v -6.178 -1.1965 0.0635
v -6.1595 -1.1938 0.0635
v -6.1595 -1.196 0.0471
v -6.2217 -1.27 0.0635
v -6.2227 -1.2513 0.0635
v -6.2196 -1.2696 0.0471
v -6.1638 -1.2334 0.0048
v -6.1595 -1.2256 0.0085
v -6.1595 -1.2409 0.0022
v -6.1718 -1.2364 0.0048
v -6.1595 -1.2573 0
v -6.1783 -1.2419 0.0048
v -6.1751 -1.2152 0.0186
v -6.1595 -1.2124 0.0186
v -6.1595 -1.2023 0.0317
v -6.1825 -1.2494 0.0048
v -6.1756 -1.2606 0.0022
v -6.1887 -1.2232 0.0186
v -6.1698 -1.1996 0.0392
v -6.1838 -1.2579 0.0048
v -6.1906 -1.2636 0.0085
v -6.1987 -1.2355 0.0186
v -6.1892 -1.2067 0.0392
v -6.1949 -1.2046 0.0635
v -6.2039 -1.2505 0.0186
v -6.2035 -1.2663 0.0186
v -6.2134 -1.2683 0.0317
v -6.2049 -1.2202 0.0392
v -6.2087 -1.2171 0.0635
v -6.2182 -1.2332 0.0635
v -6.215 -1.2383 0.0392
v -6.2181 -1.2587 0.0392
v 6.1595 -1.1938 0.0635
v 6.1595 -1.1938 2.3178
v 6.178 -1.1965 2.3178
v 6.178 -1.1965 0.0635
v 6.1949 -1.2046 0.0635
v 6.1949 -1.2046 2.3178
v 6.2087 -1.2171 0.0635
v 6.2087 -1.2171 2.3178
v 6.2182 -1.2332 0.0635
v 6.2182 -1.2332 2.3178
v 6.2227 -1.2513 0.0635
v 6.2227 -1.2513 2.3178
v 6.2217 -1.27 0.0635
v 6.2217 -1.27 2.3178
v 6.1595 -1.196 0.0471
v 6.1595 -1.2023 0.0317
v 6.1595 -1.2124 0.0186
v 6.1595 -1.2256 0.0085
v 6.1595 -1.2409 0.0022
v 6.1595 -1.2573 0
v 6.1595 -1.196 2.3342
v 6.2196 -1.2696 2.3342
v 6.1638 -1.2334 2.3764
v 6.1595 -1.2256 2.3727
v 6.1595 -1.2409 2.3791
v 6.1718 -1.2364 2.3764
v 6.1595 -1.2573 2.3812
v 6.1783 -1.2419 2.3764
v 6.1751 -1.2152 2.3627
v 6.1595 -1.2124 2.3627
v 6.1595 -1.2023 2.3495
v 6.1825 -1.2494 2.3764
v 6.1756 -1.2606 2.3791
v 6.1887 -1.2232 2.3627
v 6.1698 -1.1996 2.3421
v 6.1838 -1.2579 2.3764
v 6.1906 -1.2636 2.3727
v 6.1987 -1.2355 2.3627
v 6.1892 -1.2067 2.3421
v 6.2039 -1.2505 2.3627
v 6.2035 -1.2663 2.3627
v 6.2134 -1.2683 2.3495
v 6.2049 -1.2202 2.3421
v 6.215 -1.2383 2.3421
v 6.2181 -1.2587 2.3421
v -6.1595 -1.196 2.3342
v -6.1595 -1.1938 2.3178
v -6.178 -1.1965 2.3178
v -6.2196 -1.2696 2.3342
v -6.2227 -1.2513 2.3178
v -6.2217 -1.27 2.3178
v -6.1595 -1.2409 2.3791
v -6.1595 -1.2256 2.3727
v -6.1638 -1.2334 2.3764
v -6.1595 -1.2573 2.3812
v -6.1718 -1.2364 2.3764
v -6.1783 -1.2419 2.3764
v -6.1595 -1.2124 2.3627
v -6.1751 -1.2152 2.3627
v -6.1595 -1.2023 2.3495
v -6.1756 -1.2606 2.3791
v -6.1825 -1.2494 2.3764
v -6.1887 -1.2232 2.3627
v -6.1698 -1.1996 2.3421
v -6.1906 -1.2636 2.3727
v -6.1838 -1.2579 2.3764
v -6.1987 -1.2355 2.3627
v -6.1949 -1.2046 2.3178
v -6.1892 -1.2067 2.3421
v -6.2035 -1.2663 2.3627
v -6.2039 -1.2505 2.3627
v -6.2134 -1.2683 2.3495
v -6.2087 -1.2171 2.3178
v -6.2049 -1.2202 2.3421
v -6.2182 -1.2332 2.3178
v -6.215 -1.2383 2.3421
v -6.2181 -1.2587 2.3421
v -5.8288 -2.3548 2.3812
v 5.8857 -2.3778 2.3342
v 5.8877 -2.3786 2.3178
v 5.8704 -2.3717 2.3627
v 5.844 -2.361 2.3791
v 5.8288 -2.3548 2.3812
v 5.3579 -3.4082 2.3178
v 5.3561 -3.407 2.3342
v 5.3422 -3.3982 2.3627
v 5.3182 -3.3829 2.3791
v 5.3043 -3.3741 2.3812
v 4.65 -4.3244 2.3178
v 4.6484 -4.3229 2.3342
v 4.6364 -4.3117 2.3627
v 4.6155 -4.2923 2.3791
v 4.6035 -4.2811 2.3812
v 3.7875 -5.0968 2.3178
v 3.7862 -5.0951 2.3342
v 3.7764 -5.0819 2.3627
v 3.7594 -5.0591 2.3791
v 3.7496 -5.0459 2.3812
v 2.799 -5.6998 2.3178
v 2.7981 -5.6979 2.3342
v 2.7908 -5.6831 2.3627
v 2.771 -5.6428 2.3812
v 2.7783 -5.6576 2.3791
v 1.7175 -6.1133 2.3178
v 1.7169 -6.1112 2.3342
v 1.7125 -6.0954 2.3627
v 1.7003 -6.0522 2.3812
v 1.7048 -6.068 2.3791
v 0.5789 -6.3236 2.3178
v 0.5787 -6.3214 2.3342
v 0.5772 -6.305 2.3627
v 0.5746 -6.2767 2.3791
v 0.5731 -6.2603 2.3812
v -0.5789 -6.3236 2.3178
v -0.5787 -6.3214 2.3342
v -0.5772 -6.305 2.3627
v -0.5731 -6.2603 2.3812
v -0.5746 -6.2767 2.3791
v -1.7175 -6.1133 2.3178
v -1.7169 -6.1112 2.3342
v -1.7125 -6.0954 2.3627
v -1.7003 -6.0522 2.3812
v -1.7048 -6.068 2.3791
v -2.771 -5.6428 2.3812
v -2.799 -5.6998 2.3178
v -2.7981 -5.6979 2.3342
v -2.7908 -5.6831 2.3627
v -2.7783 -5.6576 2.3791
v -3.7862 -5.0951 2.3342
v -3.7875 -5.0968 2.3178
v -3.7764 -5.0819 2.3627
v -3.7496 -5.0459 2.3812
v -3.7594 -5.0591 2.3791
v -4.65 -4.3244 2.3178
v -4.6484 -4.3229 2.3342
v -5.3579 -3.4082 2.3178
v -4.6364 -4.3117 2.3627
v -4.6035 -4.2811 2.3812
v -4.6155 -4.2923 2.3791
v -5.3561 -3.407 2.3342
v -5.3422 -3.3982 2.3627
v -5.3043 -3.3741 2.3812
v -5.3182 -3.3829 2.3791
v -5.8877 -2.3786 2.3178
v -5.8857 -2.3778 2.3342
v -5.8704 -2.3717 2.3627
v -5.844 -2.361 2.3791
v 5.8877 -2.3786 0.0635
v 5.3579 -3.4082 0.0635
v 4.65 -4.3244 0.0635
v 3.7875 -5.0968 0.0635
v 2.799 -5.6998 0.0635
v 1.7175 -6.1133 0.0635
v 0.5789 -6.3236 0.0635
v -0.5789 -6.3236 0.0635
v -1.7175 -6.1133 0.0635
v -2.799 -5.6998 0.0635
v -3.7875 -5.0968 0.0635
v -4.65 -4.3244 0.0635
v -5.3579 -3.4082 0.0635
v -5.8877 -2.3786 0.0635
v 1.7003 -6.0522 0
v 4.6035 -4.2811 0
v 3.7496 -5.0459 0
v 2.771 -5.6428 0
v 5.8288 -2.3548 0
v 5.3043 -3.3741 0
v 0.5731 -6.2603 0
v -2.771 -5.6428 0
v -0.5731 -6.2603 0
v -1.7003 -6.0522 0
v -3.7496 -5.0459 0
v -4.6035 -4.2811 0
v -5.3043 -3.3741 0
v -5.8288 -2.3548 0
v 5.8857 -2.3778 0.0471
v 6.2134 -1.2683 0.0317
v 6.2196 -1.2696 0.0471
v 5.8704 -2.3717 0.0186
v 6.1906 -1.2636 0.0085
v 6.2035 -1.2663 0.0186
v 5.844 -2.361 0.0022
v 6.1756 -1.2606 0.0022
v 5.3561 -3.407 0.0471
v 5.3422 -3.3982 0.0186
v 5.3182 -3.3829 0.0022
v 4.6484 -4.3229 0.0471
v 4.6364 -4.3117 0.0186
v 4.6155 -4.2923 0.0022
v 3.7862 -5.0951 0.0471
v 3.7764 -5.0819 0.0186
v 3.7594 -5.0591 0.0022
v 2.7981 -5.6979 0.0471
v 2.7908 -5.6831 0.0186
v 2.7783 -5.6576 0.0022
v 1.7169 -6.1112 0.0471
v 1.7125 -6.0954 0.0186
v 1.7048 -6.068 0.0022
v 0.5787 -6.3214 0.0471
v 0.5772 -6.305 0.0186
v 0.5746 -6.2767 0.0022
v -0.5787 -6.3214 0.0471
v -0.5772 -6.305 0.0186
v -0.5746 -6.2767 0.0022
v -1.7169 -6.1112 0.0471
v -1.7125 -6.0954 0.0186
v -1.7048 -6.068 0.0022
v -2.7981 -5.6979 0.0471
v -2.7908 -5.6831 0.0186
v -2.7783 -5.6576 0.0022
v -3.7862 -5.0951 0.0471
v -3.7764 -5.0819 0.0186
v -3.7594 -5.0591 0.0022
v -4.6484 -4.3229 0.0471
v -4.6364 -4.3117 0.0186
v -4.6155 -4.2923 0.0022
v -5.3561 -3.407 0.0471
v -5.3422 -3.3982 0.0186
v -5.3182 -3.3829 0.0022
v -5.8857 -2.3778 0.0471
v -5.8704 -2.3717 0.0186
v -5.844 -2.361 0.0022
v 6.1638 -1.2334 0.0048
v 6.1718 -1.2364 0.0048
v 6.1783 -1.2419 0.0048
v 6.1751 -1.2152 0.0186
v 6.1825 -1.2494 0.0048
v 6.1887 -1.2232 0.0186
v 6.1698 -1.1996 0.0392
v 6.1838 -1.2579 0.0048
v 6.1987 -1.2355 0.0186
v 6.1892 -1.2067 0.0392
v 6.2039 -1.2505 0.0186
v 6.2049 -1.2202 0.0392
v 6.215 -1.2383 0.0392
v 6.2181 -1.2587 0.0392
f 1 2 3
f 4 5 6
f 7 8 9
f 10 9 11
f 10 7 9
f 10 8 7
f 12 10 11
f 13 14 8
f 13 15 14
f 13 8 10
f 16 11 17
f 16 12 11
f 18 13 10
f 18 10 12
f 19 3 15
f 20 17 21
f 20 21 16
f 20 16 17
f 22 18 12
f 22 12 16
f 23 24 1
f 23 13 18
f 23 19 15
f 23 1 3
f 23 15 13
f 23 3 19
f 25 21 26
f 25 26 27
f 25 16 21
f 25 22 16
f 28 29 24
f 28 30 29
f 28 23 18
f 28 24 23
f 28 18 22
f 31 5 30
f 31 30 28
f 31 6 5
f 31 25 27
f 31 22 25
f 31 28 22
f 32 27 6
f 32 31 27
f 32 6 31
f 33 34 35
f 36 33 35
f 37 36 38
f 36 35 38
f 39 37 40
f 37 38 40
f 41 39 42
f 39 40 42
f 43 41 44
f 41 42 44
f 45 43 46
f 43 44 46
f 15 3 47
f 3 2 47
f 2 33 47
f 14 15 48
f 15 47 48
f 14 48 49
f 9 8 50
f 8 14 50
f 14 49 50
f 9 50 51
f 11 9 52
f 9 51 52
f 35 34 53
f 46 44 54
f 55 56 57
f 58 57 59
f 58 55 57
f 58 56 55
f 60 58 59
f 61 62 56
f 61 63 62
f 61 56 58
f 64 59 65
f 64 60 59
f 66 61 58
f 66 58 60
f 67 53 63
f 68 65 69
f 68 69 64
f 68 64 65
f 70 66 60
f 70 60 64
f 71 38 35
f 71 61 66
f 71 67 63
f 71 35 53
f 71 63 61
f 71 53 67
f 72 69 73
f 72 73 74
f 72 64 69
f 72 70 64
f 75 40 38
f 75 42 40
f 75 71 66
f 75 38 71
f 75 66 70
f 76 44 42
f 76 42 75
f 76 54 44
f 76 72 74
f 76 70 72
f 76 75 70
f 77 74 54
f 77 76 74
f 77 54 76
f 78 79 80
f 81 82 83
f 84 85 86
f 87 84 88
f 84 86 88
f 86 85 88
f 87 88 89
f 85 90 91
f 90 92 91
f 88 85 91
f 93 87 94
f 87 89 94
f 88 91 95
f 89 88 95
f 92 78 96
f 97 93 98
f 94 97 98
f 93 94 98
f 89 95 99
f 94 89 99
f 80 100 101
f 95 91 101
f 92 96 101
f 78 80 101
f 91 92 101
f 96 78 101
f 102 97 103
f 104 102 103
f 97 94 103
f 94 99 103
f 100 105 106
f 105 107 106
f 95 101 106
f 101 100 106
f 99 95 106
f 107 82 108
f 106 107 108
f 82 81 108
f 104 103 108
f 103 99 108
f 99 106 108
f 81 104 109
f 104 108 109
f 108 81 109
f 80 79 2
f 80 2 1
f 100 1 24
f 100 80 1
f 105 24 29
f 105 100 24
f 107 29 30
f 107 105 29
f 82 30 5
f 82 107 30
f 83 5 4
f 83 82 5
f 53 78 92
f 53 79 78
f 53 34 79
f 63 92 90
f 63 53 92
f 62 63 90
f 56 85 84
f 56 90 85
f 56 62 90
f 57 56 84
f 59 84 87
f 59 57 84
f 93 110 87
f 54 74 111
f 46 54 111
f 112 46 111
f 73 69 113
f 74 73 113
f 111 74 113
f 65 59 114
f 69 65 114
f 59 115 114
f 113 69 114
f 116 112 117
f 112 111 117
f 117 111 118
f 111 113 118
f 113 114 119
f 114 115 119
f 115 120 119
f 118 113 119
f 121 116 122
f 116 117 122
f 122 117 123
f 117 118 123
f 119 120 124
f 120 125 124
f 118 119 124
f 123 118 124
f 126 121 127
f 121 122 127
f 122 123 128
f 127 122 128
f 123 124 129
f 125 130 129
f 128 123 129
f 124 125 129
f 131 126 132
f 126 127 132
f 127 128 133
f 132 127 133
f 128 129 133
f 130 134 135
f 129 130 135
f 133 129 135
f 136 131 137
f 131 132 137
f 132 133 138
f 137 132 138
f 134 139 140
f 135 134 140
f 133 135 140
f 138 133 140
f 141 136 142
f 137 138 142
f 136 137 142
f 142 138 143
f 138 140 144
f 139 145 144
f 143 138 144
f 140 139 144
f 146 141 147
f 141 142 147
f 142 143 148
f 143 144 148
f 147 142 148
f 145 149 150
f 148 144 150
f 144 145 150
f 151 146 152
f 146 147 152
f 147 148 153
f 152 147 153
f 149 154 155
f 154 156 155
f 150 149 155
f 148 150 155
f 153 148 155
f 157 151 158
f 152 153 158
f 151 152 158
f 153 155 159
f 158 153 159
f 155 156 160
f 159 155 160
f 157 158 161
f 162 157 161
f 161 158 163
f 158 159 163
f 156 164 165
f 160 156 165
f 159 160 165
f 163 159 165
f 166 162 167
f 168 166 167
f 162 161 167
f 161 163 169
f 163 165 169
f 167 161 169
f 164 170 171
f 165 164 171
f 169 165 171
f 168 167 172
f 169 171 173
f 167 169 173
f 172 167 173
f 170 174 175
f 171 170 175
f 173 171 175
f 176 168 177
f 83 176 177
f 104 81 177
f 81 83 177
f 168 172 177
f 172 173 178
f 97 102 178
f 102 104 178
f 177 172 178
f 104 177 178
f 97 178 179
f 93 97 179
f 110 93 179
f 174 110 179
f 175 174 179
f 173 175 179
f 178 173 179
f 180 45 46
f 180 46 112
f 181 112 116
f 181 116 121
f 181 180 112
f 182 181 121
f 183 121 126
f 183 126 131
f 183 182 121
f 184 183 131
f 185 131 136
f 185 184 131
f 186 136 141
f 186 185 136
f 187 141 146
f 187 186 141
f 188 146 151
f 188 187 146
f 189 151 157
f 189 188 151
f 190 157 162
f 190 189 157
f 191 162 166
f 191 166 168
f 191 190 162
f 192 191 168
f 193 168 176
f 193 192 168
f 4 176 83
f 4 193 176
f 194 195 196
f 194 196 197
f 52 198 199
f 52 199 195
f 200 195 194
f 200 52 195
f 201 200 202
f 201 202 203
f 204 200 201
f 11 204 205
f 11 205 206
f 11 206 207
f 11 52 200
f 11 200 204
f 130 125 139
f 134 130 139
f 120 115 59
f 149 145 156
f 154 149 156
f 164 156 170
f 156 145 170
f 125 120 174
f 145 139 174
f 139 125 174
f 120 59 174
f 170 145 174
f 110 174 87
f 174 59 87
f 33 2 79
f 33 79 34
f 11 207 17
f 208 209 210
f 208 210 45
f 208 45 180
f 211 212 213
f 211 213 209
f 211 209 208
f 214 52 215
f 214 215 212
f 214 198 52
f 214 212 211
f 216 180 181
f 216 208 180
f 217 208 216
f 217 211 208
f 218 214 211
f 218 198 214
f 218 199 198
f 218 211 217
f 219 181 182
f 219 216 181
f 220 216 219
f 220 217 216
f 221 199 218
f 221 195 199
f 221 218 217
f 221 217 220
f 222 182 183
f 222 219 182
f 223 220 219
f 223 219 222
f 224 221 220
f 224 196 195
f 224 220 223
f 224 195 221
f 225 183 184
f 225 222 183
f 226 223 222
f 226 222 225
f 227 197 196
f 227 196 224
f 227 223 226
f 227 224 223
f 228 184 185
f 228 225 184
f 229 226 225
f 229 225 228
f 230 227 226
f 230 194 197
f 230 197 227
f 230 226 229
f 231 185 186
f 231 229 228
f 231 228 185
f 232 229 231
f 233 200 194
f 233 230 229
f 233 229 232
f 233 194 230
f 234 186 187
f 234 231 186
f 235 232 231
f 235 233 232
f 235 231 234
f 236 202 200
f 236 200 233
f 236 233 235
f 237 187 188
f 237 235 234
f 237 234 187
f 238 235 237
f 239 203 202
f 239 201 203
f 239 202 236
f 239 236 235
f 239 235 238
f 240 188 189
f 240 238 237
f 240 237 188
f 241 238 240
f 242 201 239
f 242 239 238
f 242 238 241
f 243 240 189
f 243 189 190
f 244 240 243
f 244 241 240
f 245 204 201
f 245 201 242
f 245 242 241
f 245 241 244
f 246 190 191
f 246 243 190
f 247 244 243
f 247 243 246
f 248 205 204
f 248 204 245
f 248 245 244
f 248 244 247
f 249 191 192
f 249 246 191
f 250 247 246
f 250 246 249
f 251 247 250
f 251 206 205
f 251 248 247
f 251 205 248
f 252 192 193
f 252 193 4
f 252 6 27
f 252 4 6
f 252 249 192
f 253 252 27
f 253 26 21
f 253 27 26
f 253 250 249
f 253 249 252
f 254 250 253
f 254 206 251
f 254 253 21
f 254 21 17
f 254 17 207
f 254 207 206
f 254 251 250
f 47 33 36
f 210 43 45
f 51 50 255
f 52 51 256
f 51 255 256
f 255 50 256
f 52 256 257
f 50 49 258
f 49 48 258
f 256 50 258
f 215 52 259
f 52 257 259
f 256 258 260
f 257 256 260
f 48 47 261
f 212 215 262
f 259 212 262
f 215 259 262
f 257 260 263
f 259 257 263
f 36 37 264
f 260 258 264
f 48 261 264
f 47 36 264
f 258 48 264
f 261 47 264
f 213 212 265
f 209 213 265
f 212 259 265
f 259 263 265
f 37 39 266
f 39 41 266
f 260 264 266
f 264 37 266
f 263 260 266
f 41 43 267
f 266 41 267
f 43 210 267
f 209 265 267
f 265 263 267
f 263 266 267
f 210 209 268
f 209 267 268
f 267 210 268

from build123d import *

# Parameters (mm, degrees)
EXTRUDE1_DEPTH = 2.38125
FILLET3_R      = 0.0635


with BuildPart() as part:
    # Sketch1 → Extrude1 (new body)
    with BuildSketch(Plane.XY):
        with BuildLine():
            Line((-6.236773329, -1.1938), (6.236773329, -1.1938))
            ThreePointArc((6.236773329, -1.1938), (0, -6.35), (-6.236773329, -1.1938))
        make_face()
    extrude(amount=EXTRUDE1_DEPTH)

    # Fillet3
    fillet3_edges = [part.edges().sort_by_distance(p)[0] for p in [
        (0, -1.1938, 0),
        (0, -6.35, 0),
        (0, -6.35, 2.38125),
        (-6.236773329, -1.1938, 1.190625),
        (6.236773329, -1.1938, 1.190625),
        (0, -1.1938, 2.38125),
    ]]
    fillet(fillet3_edges, radius=FILLET3_R)


solid = part.part
